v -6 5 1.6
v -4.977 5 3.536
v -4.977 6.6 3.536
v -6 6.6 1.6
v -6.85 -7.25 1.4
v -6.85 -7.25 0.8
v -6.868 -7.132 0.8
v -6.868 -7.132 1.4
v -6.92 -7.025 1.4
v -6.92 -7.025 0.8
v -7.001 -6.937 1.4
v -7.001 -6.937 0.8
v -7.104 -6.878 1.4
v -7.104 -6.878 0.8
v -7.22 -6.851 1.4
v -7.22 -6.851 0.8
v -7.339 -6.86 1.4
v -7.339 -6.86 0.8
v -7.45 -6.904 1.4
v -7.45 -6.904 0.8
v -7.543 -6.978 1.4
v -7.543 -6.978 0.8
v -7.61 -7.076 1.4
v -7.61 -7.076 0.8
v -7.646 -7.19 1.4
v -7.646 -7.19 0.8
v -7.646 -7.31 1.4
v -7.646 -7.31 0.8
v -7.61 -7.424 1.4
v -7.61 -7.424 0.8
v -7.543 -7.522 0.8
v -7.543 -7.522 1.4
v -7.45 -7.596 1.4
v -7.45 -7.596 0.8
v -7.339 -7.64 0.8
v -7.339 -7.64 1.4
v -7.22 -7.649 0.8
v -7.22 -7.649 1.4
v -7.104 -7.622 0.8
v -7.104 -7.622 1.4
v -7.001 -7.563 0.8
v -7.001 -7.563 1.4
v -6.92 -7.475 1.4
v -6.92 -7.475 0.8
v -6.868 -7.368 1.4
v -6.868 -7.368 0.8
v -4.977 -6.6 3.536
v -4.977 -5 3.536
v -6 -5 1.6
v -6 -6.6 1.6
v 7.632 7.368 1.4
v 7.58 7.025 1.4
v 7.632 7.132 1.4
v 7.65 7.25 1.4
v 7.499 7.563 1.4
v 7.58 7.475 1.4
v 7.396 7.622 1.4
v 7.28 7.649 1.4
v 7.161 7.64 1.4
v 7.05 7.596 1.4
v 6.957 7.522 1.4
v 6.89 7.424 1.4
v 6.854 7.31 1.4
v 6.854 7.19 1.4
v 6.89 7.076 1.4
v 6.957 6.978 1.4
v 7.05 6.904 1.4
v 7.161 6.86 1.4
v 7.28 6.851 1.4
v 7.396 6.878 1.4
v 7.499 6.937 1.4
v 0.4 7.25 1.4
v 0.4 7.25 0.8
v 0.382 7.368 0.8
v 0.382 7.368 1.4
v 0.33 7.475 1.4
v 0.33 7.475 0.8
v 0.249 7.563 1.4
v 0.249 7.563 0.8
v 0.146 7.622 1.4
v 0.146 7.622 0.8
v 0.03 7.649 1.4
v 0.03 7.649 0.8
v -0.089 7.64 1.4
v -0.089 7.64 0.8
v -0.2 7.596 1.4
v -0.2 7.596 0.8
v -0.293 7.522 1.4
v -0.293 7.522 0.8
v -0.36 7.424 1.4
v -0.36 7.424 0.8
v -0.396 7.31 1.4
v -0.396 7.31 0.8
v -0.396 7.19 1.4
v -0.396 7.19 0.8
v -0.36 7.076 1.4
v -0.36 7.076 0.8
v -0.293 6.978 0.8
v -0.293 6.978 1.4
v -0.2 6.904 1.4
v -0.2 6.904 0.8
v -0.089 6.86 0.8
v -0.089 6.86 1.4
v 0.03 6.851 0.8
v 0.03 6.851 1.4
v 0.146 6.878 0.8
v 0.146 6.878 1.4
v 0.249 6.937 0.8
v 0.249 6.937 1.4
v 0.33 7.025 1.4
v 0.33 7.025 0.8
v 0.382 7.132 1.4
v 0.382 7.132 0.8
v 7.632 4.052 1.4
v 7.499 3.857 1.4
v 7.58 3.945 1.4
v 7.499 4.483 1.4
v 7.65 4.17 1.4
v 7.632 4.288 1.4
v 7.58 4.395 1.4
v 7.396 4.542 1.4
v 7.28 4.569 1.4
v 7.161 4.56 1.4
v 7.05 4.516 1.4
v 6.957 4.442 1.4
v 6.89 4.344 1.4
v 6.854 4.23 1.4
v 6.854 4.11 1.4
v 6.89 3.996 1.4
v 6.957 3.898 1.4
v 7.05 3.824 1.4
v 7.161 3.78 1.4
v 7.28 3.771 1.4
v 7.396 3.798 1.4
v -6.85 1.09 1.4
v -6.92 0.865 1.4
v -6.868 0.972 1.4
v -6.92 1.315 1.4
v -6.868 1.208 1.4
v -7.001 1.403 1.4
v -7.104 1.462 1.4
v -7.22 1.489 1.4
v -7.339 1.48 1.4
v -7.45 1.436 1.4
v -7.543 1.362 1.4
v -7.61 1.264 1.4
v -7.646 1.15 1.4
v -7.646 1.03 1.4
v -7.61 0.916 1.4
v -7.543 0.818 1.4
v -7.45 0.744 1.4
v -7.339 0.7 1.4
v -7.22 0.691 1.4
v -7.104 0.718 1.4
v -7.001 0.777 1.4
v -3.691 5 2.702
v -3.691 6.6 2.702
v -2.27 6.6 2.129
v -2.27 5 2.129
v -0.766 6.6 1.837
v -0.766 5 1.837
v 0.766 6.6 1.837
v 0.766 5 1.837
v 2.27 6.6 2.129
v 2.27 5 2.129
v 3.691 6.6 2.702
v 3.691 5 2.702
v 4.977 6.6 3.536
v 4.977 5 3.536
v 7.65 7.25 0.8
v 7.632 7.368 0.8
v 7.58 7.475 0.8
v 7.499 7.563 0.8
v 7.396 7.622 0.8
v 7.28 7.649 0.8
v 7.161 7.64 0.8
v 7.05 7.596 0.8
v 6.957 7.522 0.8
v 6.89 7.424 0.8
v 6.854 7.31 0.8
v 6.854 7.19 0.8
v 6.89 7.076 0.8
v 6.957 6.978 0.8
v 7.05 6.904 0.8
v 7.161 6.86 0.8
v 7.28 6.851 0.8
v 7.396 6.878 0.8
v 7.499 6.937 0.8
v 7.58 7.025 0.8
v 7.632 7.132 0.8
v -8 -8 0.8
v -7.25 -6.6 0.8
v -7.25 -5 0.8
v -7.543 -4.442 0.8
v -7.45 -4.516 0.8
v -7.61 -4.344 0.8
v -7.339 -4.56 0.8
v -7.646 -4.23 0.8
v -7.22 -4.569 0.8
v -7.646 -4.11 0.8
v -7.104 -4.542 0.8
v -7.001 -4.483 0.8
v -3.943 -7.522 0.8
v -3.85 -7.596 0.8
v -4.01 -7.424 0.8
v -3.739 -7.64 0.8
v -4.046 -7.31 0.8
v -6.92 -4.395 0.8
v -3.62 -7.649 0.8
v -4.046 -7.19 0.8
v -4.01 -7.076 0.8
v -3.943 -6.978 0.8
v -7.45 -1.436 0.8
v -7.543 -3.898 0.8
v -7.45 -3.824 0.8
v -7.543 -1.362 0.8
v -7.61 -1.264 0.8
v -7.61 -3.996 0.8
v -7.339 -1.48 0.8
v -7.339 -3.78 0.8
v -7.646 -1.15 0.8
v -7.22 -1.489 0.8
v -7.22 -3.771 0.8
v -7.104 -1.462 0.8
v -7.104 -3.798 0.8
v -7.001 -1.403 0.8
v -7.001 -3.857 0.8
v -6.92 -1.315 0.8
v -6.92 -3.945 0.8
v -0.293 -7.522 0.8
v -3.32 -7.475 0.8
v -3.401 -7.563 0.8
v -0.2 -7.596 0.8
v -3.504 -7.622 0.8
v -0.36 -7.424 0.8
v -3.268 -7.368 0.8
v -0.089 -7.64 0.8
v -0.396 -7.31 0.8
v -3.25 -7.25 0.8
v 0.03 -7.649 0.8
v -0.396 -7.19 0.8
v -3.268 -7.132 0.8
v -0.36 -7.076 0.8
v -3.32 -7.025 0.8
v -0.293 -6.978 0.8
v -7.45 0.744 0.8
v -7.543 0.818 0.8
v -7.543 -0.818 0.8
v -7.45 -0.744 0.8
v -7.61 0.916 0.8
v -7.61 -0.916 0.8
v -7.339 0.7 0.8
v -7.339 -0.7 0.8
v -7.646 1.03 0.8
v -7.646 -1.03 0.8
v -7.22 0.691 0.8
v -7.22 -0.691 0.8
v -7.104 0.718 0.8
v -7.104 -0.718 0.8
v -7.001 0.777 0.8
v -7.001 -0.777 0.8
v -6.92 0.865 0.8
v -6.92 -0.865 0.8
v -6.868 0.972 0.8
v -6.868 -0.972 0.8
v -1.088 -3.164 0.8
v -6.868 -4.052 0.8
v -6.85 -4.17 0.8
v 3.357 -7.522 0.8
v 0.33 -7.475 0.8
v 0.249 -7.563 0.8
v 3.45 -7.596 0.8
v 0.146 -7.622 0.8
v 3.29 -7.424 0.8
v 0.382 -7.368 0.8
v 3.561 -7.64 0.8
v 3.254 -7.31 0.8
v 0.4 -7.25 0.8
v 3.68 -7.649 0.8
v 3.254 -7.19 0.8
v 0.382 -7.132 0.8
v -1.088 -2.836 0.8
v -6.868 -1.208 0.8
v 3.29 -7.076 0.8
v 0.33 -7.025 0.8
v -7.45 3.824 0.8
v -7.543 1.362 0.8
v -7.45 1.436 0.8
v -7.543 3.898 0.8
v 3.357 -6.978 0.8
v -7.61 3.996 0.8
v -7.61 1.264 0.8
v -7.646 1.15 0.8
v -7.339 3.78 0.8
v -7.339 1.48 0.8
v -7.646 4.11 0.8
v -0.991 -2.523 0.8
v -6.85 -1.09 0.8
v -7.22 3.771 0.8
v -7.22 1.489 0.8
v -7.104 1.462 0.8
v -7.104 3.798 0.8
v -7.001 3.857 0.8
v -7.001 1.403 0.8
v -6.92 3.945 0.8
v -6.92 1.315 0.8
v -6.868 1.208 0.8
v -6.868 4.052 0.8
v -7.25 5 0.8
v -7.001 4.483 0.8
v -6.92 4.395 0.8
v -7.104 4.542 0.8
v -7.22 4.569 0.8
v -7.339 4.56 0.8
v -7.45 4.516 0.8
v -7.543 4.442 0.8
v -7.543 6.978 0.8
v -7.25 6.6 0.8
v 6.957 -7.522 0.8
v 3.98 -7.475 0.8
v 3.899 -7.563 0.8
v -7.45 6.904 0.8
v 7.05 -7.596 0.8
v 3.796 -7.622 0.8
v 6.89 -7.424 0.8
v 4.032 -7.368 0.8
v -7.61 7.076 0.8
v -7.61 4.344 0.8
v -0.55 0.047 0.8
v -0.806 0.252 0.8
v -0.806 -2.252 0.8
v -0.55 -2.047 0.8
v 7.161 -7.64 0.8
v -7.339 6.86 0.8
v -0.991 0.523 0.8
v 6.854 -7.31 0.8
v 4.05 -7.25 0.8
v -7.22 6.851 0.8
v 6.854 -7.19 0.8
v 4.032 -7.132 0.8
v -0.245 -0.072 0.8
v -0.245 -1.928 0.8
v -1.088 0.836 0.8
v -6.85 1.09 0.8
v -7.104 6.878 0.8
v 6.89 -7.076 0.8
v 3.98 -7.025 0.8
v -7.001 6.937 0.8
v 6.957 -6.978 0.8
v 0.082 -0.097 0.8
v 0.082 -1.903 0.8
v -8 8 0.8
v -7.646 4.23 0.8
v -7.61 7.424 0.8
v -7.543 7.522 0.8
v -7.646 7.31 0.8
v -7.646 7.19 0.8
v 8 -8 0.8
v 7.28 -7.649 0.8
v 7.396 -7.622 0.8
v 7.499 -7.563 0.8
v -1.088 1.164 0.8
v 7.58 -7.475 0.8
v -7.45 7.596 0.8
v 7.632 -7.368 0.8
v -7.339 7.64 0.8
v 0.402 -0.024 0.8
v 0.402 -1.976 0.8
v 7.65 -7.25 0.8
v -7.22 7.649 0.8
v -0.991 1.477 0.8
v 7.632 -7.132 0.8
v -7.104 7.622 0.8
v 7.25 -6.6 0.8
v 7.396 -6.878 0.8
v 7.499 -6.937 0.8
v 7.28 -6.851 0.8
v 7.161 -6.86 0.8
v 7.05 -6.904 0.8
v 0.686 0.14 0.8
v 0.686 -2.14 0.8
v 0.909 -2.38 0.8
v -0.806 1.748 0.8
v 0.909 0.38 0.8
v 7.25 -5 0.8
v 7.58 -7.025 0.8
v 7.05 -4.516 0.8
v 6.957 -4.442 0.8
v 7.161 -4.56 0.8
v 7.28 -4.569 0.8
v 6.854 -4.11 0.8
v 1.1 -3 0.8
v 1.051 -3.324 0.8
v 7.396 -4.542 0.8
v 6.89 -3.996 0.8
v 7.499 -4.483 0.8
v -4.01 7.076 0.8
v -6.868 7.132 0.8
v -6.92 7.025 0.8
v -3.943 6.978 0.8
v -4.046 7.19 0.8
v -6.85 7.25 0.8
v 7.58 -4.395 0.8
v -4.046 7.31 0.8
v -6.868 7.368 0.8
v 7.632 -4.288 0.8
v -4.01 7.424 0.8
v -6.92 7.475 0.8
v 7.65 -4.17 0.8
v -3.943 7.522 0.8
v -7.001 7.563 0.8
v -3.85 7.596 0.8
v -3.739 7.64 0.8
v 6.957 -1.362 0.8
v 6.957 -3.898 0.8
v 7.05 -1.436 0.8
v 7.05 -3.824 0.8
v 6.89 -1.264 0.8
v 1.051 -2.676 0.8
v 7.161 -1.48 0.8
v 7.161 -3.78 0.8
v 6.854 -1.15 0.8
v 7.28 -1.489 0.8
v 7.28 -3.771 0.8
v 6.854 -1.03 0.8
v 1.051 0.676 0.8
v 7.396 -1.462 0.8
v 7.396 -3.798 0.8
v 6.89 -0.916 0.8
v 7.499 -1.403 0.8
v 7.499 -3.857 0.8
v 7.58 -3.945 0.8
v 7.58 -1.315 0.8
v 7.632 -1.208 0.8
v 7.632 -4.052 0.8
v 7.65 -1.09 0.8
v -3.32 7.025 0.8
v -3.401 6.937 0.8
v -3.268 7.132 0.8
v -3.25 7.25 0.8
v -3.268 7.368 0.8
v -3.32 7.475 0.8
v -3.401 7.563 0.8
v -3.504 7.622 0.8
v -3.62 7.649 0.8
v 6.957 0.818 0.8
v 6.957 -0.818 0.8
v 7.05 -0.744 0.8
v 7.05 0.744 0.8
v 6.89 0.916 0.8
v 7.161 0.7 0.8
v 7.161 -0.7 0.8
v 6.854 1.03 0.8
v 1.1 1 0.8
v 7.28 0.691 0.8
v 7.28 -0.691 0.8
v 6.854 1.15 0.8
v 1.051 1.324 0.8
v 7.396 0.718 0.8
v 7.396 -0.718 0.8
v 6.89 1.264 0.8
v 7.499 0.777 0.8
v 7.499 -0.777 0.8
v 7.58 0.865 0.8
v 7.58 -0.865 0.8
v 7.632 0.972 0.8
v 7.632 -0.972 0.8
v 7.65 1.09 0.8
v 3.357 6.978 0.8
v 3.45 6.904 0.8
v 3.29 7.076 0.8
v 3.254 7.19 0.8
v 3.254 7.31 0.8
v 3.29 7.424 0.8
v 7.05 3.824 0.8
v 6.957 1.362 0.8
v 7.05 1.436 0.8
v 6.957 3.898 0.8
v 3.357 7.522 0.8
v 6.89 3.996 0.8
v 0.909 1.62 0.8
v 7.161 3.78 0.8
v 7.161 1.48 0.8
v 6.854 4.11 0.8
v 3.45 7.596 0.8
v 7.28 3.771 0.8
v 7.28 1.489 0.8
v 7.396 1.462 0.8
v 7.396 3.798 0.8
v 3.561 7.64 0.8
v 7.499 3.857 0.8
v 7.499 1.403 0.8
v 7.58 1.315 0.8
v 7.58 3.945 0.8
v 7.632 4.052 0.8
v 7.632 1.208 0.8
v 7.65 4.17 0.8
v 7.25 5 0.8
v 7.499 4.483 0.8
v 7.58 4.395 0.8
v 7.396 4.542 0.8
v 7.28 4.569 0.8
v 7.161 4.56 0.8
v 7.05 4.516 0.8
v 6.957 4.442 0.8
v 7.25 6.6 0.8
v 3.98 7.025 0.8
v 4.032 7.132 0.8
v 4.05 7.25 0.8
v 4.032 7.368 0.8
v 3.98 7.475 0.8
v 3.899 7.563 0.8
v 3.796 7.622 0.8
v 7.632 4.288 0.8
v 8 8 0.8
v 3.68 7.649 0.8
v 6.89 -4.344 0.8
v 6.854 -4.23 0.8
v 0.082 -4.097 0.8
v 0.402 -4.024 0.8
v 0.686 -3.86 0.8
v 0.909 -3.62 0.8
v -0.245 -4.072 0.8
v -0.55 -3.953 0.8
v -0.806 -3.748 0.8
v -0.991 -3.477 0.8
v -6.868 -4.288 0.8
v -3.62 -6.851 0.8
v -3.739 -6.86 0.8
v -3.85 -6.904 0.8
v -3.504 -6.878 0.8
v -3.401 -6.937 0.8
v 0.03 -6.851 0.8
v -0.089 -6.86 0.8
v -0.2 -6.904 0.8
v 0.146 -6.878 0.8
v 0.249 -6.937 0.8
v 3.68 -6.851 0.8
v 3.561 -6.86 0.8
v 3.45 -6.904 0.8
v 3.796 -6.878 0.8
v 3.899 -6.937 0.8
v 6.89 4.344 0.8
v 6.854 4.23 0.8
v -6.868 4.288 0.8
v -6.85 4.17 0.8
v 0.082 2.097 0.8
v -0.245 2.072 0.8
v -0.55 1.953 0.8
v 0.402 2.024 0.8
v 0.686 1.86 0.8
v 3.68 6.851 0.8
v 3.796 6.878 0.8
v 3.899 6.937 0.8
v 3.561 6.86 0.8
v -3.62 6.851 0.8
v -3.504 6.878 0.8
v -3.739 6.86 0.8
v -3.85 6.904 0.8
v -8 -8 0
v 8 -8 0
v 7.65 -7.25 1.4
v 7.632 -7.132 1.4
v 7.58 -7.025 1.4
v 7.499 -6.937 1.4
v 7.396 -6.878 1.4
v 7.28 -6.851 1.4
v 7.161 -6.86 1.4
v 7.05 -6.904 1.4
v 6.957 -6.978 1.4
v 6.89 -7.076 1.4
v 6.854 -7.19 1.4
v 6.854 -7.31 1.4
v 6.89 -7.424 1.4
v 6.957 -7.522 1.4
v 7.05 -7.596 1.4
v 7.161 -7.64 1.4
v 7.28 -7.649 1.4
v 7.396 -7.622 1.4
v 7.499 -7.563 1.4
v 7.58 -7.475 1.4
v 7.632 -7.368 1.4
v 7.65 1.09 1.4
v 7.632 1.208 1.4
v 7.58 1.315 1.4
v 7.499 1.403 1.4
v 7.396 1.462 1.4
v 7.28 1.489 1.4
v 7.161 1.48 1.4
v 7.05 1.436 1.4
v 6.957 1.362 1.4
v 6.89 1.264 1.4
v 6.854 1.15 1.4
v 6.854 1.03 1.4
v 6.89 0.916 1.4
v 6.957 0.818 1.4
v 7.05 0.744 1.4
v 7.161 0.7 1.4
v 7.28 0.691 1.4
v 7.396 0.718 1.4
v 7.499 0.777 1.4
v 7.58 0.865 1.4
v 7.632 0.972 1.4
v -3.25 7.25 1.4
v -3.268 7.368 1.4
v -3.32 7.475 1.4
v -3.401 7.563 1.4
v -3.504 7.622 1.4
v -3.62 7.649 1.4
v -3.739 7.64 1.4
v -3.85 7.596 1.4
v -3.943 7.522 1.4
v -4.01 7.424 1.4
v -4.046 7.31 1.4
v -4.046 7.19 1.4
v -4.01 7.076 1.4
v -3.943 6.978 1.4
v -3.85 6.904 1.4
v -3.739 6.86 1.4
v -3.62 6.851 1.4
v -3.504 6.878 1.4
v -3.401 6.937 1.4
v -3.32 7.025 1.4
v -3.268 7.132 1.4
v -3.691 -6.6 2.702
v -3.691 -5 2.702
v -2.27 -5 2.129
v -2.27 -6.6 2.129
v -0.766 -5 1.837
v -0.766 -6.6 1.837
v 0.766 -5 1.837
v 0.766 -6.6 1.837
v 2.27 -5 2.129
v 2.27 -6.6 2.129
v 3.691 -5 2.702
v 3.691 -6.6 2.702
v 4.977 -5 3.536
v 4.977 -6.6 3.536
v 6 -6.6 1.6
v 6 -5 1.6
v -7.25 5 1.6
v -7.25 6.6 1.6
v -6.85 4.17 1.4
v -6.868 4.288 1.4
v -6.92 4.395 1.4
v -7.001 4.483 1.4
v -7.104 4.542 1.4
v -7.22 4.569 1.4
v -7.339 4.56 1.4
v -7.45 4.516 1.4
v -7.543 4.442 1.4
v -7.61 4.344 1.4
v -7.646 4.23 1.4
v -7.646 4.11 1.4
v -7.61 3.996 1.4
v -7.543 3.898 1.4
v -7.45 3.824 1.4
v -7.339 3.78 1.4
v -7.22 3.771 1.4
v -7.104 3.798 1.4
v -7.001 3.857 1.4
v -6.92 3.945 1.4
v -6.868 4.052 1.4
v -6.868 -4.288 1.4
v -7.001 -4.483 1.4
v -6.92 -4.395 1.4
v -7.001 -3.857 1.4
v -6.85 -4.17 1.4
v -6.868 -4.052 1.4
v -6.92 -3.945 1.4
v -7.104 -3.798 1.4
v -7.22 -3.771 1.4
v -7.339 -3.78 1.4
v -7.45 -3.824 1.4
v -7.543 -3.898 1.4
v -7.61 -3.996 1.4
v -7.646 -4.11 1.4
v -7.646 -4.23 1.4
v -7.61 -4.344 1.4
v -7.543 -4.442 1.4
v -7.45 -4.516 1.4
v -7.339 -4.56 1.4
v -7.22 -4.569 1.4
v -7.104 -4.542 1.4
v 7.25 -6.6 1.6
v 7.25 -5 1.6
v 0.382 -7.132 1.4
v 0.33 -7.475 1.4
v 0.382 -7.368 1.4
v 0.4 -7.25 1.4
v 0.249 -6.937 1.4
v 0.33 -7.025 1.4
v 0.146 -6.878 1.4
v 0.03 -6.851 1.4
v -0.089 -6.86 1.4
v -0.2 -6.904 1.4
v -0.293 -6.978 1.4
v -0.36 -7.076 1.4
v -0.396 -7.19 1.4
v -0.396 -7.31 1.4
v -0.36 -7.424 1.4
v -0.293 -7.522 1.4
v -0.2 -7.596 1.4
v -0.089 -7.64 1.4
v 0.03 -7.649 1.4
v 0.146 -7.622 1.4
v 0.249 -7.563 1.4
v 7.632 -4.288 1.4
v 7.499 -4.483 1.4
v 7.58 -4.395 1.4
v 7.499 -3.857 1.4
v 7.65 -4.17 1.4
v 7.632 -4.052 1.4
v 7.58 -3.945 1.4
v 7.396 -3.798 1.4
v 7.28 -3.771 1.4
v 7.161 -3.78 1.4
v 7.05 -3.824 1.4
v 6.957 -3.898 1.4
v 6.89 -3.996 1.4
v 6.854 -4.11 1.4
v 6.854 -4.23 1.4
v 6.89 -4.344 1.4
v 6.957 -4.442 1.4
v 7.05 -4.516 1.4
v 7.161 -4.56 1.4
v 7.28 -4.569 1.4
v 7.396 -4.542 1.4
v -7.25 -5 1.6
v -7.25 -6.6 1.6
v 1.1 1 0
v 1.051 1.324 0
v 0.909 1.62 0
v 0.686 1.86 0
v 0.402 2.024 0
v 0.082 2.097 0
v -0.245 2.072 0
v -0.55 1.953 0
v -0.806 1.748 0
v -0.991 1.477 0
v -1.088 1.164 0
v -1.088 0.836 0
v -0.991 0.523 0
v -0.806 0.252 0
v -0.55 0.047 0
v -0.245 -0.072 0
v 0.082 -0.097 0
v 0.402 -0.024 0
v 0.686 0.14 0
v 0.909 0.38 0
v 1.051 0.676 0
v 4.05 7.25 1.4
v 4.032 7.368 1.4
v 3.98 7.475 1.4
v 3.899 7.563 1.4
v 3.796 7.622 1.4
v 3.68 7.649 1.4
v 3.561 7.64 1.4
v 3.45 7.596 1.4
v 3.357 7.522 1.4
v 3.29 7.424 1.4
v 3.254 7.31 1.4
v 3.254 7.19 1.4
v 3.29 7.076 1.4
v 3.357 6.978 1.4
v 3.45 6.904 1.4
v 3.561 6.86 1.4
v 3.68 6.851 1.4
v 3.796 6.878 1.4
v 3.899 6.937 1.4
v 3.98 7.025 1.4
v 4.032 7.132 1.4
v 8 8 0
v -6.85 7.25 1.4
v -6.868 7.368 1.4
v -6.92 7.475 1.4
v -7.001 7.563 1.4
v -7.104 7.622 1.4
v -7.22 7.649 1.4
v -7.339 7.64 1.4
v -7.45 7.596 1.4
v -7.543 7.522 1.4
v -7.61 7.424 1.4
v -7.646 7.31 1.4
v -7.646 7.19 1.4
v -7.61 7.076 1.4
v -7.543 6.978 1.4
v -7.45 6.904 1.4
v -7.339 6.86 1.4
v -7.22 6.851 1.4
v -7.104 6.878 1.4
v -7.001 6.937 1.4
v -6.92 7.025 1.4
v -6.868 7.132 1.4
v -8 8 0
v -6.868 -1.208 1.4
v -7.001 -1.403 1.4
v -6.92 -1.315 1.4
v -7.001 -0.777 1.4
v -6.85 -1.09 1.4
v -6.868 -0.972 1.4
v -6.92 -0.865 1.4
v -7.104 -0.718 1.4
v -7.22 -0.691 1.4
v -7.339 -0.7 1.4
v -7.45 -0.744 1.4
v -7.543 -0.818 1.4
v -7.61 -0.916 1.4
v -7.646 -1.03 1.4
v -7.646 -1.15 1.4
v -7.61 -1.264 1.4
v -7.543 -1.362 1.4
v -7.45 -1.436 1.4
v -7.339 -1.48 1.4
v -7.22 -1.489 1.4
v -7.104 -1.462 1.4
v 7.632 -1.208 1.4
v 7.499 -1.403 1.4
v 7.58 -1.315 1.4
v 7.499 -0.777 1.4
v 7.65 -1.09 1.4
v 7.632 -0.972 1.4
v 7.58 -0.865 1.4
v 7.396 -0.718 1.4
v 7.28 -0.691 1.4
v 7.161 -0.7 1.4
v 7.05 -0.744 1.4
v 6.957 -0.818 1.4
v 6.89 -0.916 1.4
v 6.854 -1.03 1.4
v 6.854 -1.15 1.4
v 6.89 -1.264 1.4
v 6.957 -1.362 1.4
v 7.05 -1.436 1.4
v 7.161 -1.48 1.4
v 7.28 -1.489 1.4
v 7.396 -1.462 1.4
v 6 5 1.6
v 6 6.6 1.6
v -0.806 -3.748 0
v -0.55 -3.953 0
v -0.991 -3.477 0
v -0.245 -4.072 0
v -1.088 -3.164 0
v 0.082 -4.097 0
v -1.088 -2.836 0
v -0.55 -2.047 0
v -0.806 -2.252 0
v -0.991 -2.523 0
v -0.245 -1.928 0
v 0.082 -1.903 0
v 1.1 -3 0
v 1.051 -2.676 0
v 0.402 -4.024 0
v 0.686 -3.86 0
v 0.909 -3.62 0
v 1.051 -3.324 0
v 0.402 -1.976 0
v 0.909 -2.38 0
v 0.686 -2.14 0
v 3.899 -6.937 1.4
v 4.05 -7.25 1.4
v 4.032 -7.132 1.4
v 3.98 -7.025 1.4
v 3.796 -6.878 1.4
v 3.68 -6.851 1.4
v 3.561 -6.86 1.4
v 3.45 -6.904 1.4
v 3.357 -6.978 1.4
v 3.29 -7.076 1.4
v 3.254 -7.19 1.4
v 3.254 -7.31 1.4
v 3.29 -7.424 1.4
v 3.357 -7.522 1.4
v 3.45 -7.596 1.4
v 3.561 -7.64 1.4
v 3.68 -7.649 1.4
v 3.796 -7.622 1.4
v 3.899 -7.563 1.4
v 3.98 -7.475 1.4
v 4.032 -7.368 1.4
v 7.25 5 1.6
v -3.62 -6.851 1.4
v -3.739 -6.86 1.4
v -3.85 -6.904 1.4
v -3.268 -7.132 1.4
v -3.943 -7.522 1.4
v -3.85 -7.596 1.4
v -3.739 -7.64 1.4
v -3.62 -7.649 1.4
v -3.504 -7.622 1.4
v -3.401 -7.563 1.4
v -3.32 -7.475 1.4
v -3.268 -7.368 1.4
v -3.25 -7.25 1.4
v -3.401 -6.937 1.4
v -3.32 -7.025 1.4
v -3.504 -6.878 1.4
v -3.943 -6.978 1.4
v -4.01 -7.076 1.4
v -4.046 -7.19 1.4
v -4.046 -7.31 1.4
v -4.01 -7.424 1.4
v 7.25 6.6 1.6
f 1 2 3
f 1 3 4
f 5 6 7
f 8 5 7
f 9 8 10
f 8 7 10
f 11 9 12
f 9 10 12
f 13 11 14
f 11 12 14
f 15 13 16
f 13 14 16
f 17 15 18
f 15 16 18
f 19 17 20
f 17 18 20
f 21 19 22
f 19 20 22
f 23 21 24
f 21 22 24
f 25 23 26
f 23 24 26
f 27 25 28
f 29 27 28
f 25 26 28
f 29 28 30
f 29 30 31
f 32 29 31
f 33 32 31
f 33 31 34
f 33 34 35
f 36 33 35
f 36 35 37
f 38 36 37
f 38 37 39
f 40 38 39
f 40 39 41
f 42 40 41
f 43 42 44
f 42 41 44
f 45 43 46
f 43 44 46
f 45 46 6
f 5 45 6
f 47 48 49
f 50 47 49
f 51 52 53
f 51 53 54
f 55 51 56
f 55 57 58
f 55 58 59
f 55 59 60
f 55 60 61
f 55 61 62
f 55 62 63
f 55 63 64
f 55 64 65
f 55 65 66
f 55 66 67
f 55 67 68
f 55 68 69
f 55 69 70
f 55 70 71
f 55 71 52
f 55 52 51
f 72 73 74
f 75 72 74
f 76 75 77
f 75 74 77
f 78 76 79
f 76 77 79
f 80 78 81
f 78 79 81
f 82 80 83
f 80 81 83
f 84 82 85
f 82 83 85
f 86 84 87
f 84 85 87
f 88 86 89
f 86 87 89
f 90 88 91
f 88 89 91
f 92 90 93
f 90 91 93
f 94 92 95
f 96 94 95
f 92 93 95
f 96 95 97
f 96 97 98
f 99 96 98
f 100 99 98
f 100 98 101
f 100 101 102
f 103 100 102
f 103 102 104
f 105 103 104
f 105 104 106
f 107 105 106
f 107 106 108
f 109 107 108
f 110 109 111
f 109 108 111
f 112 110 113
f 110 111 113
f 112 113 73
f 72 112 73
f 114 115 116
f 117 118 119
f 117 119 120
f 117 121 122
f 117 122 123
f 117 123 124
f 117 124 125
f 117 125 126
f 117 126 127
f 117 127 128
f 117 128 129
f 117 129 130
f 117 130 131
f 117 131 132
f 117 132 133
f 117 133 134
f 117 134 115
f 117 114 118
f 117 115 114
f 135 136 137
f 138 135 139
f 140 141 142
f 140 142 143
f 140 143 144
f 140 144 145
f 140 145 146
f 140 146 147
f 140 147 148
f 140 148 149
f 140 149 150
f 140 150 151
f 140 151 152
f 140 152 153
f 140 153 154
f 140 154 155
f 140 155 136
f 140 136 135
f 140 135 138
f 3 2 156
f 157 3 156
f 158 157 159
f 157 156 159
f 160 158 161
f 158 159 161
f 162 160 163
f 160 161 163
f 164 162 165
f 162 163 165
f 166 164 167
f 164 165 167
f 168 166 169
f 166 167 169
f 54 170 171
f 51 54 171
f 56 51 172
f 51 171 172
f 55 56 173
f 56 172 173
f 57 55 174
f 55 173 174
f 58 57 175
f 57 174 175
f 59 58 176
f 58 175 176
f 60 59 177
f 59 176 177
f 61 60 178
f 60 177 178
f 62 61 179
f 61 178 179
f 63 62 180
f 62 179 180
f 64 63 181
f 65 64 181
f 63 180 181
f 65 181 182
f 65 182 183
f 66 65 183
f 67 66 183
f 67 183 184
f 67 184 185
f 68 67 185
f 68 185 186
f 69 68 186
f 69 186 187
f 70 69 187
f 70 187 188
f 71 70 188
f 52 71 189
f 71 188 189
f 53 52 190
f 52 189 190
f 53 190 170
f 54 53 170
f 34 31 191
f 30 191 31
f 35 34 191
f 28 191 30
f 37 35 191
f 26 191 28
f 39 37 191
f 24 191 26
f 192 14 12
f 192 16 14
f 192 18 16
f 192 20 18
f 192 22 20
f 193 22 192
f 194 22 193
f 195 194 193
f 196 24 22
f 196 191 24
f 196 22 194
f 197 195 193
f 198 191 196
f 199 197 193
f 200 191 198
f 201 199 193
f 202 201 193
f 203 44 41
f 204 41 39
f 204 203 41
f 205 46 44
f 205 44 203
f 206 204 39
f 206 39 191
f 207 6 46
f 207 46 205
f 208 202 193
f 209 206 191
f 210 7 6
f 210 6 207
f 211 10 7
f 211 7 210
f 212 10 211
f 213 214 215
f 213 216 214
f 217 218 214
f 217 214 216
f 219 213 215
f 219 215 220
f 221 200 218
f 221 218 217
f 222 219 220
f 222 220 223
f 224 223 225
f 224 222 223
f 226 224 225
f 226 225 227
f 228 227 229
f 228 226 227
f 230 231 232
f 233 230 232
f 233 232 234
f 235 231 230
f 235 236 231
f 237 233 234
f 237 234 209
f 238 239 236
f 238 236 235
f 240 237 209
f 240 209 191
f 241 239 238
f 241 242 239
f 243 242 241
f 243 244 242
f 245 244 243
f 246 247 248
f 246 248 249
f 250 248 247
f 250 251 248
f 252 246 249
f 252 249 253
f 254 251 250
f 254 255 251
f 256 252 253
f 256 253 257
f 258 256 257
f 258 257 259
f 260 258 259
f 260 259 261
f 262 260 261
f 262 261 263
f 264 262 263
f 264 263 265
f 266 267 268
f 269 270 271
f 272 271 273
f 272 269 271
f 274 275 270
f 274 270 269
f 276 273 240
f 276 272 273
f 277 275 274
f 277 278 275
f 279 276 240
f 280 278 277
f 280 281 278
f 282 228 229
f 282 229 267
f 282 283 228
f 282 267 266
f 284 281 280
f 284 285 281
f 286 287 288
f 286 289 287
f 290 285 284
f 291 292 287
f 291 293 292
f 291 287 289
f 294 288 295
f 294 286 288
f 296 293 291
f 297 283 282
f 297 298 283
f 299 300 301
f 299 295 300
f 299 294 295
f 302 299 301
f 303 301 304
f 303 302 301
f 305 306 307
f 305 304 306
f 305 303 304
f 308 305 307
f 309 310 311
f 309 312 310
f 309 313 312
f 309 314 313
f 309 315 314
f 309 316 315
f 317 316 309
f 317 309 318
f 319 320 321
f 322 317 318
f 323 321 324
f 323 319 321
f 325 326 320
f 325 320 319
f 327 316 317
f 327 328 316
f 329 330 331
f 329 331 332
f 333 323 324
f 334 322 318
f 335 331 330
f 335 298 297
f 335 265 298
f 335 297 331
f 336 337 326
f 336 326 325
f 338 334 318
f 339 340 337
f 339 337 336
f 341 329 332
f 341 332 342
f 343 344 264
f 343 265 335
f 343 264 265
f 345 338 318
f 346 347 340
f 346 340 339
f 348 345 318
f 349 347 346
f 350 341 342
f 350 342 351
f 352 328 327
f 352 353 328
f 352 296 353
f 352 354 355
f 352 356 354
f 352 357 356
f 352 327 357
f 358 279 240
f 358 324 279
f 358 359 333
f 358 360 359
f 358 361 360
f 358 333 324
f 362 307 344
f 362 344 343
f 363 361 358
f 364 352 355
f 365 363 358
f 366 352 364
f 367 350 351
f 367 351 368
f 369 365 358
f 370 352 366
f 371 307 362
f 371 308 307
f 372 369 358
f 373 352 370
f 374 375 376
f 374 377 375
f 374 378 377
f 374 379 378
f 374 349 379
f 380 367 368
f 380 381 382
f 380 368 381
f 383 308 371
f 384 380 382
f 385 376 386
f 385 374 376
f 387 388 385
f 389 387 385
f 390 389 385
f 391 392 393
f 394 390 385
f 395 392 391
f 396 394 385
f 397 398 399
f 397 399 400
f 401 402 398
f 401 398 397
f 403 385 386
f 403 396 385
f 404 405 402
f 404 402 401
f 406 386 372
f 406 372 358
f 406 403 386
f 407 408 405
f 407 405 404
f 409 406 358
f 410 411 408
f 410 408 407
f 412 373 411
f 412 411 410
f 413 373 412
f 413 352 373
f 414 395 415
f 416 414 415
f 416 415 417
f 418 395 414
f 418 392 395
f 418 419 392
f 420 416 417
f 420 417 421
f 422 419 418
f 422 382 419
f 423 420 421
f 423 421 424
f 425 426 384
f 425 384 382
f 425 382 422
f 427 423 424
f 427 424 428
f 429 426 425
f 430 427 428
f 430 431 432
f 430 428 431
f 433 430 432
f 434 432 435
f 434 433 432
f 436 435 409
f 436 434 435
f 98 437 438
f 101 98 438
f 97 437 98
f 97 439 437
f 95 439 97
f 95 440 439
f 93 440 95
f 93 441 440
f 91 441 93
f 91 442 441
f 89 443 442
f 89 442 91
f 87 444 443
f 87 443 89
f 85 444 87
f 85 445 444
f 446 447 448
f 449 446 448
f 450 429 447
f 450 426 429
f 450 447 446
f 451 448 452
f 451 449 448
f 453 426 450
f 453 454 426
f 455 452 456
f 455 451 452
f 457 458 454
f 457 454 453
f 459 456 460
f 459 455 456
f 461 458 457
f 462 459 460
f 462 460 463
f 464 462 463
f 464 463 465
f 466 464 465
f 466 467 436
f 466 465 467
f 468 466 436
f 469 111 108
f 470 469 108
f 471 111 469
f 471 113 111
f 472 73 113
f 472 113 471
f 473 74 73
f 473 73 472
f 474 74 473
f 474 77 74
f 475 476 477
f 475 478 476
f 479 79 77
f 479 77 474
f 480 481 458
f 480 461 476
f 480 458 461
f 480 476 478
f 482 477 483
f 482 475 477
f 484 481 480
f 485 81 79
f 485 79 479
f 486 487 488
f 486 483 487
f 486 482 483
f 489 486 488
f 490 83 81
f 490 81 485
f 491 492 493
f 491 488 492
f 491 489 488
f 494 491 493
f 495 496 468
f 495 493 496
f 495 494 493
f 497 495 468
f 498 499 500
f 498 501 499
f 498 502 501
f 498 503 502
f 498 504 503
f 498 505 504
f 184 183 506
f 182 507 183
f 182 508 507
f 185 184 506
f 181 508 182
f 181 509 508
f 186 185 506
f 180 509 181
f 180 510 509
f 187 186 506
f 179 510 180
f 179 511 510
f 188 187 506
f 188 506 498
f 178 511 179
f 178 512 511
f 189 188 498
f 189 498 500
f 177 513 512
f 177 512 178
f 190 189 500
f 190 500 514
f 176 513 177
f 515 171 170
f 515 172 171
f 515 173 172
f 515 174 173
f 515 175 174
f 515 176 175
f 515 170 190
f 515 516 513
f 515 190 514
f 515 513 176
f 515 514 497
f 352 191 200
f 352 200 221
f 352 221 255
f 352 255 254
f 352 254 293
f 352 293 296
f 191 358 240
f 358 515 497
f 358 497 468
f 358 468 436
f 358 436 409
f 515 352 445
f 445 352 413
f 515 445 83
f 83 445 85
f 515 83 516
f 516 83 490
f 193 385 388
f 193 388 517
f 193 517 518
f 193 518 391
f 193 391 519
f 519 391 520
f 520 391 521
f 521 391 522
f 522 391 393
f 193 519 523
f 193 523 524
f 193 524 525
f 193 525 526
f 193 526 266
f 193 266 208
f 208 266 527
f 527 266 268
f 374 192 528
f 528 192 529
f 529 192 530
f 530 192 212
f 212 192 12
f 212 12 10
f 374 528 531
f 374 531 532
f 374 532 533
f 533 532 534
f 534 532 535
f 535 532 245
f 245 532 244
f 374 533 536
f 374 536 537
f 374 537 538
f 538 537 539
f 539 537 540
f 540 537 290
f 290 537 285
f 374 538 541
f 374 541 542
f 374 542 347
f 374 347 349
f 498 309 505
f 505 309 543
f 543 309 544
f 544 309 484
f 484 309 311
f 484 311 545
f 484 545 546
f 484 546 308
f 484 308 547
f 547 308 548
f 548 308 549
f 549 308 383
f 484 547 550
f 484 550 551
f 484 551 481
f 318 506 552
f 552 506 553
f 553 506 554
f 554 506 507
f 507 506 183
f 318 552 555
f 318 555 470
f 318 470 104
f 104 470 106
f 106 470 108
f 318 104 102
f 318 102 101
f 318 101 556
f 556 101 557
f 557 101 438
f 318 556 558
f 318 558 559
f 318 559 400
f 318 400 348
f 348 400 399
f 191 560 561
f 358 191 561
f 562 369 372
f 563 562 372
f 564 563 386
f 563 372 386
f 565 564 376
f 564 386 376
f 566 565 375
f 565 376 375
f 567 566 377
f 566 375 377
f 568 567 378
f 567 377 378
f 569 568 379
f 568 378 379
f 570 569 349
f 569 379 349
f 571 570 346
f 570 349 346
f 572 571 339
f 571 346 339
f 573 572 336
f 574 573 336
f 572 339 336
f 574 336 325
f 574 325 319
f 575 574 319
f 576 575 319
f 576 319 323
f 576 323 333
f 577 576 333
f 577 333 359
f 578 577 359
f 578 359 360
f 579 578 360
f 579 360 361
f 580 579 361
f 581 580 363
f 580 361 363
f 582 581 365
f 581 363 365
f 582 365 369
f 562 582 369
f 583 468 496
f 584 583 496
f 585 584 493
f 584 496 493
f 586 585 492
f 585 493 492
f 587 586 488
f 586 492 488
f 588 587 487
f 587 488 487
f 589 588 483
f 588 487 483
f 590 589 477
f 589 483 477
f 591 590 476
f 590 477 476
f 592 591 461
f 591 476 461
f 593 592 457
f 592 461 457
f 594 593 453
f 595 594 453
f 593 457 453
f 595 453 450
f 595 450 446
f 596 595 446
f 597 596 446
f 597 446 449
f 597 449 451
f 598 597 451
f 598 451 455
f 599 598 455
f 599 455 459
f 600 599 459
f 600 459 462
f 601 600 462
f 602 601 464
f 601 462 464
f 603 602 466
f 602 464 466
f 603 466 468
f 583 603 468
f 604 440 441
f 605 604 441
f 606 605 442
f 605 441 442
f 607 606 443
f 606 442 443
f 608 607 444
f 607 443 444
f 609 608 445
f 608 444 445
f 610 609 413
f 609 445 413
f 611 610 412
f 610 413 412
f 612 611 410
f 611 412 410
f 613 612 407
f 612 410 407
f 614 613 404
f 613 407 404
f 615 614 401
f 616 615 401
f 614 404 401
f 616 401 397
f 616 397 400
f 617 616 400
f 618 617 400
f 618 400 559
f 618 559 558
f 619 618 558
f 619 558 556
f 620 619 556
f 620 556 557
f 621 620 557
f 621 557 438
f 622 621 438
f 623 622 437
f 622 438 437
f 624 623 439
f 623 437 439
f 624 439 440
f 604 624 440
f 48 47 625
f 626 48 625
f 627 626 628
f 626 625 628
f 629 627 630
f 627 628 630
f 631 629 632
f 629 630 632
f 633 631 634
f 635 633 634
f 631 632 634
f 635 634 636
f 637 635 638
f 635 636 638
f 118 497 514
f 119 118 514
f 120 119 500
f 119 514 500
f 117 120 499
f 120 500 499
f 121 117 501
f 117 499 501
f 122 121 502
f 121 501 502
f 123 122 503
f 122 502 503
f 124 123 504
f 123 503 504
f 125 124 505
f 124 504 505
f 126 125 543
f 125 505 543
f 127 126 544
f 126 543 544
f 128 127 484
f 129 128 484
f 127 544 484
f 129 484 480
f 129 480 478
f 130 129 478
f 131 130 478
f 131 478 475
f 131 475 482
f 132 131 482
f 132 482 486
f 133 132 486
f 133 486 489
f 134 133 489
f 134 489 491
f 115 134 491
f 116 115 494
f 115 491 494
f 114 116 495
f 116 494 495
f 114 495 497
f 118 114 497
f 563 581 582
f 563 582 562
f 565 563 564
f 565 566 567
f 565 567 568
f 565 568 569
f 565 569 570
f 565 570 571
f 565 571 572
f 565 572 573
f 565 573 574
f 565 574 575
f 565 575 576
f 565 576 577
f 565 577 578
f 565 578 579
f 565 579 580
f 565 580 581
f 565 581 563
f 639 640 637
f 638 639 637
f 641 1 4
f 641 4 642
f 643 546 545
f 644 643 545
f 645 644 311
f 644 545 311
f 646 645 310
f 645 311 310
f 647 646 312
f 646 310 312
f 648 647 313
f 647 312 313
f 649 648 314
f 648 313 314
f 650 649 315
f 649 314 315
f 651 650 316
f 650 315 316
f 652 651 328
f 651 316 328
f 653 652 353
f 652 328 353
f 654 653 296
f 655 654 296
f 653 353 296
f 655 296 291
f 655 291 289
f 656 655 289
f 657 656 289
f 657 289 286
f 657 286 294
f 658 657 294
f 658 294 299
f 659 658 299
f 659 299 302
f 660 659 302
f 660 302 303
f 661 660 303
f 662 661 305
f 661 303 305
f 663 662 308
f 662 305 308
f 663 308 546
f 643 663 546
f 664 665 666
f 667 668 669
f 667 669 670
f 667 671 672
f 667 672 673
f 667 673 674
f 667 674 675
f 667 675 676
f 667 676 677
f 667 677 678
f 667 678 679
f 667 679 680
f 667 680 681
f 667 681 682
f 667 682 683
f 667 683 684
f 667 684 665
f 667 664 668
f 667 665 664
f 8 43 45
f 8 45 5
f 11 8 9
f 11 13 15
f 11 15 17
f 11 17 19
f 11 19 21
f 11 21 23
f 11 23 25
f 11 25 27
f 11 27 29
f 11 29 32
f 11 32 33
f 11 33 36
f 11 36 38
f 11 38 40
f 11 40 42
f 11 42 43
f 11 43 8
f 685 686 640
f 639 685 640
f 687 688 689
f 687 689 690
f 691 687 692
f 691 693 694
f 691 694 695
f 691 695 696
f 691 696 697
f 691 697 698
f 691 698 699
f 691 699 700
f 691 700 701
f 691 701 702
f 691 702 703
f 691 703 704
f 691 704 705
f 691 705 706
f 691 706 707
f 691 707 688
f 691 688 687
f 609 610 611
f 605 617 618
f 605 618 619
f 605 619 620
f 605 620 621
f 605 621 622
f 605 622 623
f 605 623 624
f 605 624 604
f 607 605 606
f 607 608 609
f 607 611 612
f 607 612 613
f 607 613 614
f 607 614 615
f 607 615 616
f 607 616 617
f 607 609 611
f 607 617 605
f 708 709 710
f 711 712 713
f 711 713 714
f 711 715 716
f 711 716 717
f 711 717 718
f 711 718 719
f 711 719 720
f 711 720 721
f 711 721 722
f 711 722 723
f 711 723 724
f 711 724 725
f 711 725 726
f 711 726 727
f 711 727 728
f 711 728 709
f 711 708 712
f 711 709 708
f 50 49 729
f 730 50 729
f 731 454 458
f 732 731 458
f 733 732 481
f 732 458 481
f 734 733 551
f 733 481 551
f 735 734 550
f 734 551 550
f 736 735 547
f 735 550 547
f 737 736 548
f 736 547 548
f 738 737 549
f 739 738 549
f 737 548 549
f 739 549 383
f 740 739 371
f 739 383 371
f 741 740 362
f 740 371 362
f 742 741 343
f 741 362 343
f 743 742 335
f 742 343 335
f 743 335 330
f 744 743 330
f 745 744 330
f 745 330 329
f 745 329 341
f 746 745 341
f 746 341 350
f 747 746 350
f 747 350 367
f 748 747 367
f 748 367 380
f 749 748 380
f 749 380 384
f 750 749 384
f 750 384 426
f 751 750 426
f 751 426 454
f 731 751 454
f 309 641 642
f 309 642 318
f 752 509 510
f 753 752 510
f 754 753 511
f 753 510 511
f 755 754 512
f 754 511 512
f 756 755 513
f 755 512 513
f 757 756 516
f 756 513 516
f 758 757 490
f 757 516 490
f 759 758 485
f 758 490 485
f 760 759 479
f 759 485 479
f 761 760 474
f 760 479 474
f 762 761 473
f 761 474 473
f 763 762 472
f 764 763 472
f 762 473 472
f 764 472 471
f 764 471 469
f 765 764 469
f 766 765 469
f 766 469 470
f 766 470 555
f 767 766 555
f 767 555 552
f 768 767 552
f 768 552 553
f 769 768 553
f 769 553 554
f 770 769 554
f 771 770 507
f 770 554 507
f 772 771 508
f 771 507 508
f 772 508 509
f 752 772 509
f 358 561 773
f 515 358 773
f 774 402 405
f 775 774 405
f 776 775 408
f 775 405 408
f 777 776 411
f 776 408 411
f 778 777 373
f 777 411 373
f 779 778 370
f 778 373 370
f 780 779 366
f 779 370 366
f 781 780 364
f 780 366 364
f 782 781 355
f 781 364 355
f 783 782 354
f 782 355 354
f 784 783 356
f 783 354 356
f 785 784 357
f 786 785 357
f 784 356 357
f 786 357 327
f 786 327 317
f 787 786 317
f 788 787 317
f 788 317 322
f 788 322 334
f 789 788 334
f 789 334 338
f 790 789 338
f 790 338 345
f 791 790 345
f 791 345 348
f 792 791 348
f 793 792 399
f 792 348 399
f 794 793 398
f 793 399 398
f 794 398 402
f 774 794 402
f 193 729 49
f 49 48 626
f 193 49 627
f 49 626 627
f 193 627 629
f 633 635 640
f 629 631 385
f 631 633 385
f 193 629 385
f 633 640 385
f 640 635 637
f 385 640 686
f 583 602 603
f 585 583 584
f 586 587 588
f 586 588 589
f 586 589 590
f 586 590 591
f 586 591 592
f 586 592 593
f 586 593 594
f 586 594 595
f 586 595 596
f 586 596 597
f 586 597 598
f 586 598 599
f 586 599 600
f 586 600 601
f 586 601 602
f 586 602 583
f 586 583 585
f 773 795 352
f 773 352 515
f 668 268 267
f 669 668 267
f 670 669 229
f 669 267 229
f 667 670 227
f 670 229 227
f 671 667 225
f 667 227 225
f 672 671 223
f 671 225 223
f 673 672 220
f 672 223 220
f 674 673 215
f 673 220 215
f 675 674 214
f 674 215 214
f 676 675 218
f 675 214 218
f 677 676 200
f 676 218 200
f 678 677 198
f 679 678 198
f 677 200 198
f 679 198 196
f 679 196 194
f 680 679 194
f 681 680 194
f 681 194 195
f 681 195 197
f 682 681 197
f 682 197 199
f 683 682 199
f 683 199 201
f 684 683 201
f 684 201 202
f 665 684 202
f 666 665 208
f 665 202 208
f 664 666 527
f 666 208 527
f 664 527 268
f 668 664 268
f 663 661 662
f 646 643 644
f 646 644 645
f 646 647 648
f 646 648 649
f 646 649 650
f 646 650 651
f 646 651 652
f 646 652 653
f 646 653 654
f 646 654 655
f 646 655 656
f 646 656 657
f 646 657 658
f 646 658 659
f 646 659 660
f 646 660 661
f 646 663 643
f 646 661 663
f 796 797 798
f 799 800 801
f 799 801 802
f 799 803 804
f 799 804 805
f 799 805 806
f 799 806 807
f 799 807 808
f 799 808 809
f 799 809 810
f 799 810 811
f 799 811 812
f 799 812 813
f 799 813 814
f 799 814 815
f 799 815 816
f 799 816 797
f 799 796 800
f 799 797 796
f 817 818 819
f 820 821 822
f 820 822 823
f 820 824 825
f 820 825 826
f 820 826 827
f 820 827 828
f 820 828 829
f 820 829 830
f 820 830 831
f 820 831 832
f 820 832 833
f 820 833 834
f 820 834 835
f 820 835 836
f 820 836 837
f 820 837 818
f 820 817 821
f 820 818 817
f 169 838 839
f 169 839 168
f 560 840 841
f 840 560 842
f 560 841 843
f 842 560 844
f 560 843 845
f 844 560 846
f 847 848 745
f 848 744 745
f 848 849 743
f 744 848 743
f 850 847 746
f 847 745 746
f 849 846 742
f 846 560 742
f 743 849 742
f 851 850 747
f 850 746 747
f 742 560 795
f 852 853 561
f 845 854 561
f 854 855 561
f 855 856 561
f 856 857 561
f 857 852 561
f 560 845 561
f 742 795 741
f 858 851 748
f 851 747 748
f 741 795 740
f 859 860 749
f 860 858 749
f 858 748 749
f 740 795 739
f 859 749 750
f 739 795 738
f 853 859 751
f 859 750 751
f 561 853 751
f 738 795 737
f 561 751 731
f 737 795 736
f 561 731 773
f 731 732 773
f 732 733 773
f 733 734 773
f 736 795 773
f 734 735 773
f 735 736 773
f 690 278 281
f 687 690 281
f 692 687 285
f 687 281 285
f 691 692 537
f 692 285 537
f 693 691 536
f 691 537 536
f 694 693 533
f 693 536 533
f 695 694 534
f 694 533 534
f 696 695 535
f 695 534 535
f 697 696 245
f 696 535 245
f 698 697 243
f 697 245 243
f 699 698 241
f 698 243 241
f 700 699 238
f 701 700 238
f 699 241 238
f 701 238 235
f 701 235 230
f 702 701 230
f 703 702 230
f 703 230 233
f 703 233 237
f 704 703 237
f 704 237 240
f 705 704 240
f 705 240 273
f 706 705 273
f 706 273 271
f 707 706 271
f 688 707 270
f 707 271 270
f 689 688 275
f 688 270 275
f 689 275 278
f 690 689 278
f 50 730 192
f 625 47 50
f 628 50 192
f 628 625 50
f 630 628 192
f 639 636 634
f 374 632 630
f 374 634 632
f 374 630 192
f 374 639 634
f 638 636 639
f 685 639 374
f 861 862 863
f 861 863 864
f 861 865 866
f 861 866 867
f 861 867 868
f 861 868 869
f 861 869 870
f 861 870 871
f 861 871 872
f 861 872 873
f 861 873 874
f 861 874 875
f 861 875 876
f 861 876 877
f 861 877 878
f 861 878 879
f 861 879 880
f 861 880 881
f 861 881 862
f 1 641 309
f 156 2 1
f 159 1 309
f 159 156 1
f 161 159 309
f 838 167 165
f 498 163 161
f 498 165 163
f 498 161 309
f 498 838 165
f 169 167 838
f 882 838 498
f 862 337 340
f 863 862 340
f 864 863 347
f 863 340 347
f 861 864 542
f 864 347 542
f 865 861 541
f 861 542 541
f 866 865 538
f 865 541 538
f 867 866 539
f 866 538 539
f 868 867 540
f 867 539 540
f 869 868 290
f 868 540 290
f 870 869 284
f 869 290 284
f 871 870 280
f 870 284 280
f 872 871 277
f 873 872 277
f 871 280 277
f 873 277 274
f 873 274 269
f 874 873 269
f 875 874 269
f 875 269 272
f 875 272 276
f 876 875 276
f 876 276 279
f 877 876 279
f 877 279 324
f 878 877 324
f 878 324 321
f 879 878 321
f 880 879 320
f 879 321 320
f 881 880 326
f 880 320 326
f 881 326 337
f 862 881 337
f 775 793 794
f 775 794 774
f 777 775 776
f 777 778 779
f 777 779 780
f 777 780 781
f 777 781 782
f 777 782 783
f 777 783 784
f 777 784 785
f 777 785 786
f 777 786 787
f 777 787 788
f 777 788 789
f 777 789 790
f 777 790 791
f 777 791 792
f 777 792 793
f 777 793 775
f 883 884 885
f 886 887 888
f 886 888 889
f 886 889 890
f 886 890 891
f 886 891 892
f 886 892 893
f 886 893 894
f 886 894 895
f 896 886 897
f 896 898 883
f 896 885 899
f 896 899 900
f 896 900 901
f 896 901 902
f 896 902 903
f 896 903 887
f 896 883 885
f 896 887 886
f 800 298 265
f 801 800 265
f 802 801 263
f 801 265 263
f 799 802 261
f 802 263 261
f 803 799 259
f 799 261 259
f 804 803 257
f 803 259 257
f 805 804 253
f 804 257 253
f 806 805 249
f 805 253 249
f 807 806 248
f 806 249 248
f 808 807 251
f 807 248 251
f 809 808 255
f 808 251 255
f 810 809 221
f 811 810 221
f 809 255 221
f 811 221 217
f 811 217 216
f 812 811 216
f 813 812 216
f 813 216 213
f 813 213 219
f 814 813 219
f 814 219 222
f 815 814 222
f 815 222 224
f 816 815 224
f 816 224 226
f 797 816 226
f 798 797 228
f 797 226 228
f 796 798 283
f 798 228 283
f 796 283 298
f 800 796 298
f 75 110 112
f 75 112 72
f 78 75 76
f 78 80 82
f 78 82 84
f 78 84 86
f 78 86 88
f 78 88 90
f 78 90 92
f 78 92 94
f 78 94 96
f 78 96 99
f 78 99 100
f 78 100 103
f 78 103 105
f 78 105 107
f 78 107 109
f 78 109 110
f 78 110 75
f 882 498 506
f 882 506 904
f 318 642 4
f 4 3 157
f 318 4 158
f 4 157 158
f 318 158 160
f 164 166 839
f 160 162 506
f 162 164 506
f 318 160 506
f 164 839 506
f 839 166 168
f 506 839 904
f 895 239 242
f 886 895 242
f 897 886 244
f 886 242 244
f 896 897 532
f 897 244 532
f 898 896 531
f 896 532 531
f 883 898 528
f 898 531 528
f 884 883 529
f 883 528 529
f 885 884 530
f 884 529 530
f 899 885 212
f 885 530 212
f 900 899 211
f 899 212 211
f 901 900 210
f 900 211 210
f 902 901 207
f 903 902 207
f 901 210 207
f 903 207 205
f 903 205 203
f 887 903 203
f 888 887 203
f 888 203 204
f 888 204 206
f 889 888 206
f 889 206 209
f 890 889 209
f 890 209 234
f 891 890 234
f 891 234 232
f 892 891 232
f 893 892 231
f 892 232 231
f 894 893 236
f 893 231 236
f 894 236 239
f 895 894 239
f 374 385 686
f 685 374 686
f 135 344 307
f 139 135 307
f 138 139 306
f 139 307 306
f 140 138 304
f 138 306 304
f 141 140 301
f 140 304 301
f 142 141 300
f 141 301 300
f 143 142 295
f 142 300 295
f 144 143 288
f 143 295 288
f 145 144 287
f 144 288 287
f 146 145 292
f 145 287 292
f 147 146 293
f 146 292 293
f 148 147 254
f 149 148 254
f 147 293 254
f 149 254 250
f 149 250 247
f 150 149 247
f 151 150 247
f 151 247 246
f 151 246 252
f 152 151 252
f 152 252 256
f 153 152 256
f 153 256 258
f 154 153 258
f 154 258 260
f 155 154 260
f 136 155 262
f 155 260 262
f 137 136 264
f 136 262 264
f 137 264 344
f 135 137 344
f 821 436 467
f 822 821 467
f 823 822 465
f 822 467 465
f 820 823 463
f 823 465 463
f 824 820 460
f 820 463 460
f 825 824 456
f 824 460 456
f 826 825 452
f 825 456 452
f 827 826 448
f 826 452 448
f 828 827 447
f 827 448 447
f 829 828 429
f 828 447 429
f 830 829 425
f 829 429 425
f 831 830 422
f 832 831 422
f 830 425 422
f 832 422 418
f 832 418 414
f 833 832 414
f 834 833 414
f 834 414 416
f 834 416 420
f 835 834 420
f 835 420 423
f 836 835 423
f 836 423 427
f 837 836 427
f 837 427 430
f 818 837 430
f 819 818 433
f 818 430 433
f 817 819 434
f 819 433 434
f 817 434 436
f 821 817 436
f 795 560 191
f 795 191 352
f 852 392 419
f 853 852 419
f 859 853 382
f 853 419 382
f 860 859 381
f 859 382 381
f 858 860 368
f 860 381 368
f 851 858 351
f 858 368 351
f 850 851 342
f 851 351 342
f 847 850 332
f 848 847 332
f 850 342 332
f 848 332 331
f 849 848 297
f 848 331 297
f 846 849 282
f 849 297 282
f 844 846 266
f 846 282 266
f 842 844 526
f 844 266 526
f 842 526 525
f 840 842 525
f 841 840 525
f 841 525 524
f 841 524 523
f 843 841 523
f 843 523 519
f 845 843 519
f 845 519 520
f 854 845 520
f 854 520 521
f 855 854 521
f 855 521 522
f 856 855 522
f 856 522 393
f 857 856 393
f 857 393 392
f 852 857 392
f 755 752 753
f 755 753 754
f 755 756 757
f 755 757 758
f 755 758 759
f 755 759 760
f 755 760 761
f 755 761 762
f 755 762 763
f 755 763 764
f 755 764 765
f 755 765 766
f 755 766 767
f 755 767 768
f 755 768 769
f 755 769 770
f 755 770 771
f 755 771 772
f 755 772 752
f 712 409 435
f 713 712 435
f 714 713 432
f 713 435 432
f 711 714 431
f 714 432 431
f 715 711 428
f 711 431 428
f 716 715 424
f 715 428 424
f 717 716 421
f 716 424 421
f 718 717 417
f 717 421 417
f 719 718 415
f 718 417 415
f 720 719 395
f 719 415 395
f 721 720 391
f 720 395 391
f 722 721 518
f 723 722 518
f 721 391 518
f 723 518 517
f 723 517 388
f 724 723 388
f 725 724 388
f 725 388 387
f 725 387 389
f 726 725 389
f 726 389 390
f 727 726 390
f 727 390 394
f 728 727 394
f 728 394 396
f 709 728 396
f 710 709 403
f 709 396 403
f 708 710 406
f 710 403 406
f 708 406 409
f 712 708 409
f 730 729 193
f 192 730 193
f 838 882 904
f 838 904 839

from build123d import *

# Parameters (mm, degrees)
F0_W      = 16
F0_H      = 16
F1_DEPTH  = 0.8
F2_R      = 0.4
F3_DEPTH  = 0.6
F6_DEPTH  = 1.6
F8_R      = 8
F9_DEPTH  = 12.5
F10_R     = 1.1
F11_DEPTH = 0.801


with BuildPart() as f1:
    # F0 (on Top) → F1 (new body)
    with BuildSketch(Plane.XY):
        Rectangle(F0_W, F0_H)
    extrude(amount=F1_DEPTH)

    # F2 (on face) → F3 (join)
    with BuildSketch(Plane.XY.offset(0.8)):
        with Locations((-7.25, 7.25)):
            Circle(F2_R)
        with Locations((-7.25, 4.17)):
            Circle(F2_R)
        with Locations((-7.25, 1.09)):
            Circle(F2_R)
        with Locations((-7.25, -1.09)):
            Circle(F2_R)
        with Locations((-7.25, -4.17)):
            Circle(F2_R)
        with Locations((-7.25, -7.25)):
            Circle(F2_R)
        with Locations((-3.65, 7.25)):
            Circle(F2_R)
        with Locations((0, 7.25)):
            Circle(F2_R)
        with Locations((3.65, 7.25)):
            Circle(F2_R)
        with Locations((7.25, 7.25)):
            Circle(F2_R)
        with Locations((7.25, 4.17)):
            Circle(F2_R)
        with Locations((7.25, 1.09)):
            Circle(F2_R)
        with Locations((7.25, -1.09)):
            Circle(F2_R)
        with Locations((7.25, -4.17)):
            Circle(F2_R)
        with Locations((7.25, -7.25)):
            Circle(F2_R)
        with Locations((0, -7.25)):
            Circle(F2_R)
        with Locations((3.65, -7.25)):
            Circle(F2_R)
        with Locations((-3.65, -7.25)):
            Circle(F2_R)
    extrude(amount=F3_DEPTH)

    # F5 (on offset) → F6 (join)
    with BuildSketch(Plane.XZ.offset(5)):
        with BuildLine():
            ThreePointArc((4.5, 4.4380973526), (0, 2.8), (-4.5, 4.4380973526))
            Line((-4.5, 4.4380973526), (-6, 1.6))
            Line((-6, 1.6), (-7.25, 1.6))
            Line((-7.25, 1.6), (-7.25, 0.8))
            Line((-7.25, 0.8), (7.25, 0.8))
            Line((7.25, 0.8), (7.25, 1.6))
            Line((7.25, 1.6), (6, 1.6))
            Line((6, 1.6), (4.5, 4.4380973526))
        make_face()
    extrude(amount=F6_DEPTH)

    # F7: F1 across plane


with BuildPart() as f1_1:
    add(f1.part)
    add(f1.part.mirror(Plane.XZ))

    # F8 (on offset) → F9 (cut, symmetric)
    with BuildSketch(Plane.XZ.offset(5)):
        with Locations((0, 9.8)):
            Circle(F8_R)
    extrude(amount=F9_DEPTH, both=True, mode=Mode.SUBTRACT)

    # F10 (on face) → F11 (cut, through all)
    with BuildSketch(Plane.XY.offset(0.8)):
        with Locations((0, -3)):
            Circle(F10_R)
        with Locations((0, 1)):
            Circle(F10_R)
    extrude(amount=-F11_DEPTH, mode=Mode.SUBTRACT)


solid = f1_1.part
